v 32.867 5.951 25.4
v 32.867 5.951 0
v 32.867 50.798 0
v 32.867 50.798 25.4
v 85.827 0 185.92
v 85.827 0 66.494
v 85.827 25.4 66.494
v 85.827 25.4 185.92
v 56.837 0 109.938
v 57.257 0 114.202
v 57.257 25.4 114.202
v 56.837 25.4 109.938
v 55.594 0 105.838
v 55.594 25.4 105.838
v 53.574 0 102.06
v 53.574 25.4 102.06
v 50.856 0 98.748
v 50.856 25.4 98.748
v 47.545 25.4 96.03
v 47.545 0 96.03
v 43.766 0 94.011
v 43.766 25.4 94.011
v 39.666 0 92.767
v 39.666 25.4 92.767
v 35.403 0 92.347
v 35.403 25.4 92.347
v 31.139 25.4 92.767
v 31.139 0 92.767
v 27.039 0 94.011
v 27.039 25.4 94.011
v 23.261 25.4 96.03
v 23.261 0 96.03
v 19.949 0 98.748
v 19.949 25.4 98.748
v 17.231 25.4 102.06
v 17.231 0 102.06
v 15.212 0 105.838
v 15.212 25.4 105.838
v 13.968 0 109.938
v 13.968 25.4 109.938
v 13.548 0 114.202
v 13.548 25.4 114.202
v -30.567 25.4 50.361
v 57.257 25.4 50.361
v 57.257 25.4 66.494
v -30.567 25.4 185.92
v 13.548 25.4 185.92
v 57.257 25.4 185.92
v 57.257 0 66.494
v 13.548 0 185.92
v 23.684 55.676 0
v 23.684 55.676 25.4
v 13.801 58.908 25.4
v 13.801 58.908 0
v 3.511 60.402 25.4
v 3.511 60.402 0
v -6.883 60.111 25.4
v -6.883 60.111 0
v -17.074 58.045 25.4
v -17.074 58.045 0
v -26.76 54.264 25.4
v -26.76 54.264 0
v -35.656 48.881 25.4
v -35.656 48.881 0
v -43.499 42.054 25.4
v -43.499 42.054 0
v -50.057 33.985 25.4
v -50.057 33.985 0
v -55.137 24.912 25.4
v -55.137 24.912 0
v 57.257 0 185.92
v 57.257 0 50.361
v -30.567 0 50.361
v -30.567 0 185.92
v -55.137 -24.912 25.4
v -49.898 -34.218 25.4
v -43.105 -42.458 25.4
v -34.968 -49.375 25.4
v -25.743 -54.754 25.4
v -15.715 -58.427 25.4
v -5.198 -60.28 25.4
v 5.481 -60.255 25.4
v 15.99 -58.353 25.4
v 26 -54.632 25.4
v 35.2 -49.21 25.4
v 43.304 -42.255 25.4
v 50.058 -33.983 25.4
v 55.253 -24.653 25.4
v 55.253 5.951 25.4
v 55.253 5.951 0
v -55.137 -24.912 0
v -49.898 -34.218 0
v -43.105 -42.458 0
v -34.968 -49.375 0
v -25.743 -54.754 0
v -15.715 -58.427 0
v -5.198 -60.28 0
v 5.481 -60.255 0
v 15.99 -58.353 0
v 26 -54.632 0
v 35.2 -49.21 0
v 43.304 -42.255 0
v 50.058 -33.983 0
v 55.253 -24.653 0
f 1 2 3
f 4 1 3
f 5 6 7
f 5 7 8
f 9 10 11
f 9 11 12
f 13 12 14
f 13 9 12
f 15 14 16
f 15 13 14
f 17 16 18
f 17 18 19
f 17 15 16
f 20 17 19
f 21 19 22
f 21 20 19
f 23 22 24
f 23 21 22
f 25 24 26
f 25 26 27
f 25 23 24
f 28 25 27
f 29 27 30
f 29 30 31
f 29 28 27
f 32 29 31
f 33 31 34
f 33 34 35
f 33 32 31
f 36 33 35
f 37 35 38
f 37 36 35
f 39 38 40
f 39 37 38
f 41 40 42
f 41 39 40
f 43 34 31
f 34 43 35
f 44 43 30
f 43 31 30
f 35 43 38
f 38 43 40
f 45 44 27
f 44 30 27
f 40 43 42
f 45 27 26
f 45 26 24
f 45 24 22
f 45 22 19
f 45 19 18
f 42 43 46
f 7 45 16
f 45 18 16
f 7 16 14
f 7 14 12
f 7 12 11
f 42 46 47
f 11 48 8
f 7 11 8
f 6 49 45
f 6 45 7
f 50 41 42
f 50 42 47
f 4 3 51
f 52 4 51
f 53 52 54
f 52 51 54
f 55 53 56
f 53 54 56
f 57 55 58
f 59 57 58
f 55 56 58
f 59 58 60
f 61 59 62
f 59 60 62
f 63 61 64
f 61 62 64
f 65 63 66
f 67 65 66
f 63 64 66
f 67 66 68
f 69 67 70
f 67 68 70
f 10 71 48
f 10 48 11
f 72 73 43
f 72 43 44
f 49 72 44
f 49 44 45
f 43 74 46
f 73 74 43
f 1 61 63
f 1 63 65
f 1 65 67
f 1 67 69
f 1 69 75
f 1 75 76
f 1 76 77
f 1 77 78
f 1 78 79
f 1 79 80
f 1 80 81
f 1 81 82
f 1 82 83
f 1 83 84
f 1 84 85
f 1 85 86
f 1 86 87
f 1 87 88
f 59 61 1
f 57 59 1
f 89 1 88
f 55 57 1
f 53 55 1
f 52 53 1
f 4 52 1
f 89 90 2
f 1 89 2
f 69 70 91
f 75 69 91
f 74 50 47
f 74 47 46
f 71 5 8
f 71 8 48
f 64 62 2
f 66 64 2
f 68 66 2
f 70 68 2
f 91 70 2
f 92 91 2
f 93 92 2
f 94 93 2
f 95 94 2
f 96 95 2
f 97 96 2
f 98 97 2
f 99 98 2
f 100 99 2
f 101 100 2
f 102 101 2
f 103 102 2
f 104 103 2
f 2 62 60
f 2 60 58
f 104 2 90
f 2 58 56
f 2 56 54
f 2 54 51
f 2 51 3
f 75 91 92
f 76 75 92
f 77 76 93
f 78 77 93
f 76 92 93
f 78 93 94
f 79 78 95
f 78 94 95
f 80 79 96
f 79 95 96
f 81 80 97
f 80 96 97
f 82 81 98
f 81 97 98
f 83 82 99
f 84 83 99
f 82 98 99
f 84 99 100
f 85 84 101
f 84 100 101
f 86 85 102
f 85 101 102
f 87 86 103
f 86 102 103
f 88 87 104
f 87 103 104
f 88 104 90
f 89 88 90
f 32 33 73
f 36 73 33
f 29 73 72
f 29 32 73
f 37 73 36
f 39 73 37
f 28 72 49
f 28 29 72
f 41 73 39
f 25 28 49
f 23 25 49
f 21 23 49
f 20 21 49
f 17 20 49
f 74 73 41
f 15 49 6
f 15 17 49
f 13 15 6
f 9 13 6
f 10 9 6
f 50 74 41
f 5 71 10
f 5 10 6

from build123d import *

# Parameters (mm, degrees)
F1_DEPTH = 25.4
F3_DEPTH = 25.4


with BuildPart() as f1:
    # F0 (on Top) → F1 (new body)
    with BuildSketch(Plane.XY):
        with BuildLine():
            Line((32.86688, 5.951313), (32.86688, 50.798145))
            ThreePointArc((32.86688, 50.798145), (-17.073622, 58.044593), (-55.136811, 24.912155))
            Line((-55.136811, 24.912155), (-55.136811, -24.912155))
            ThreePointArc((-55.136811, -24.912155), (0.142112, -60.503415), (55.253231, -24.652867))
            Line((55.253231, -24.652867), (55.253231, 5.951313))
            Line((55.253231, 5.951313), (32.86688, 5.951313))
        make_face()
    extrude(amount=F1_DEPTH)


with BuildPart() as f3:
    # F2 (on Front) → F3 (new body)
    with BuildSketch(Plane.XZ):
        with BuildLine():
            Line((-30.567043, 185.919642), (-30.567043, 50.361454))
            Line((-30.567043, 50.361454), (57.257362, 50.361454))
            Line((57.257362, 50.361454), (57.257362, 66.493675))
            Line((57.257362, 66.493675), (85.82674, 66.493675))
            Line((85.82674, 66.493675), (85.82674, 185.919642))
            Line((85.82674, 185.919642), (57.257362, 185.919642))
            Line((57.257362, 185.919642), (57.257362, 114.201643))
            ThreePointArc((57.257362, 114.201643), (35.402786, 92.347067), (13.54821, 114.201643))
            Line((13.54821, 114.201643), (13.54821, 185.919642))
            Line((13.54821, 185.919642), (-30.567043, 185.919642))
        make_face()
    extrude(amount=-F3_DEPTH)


solid = Compound([f1.part, f3.part])
